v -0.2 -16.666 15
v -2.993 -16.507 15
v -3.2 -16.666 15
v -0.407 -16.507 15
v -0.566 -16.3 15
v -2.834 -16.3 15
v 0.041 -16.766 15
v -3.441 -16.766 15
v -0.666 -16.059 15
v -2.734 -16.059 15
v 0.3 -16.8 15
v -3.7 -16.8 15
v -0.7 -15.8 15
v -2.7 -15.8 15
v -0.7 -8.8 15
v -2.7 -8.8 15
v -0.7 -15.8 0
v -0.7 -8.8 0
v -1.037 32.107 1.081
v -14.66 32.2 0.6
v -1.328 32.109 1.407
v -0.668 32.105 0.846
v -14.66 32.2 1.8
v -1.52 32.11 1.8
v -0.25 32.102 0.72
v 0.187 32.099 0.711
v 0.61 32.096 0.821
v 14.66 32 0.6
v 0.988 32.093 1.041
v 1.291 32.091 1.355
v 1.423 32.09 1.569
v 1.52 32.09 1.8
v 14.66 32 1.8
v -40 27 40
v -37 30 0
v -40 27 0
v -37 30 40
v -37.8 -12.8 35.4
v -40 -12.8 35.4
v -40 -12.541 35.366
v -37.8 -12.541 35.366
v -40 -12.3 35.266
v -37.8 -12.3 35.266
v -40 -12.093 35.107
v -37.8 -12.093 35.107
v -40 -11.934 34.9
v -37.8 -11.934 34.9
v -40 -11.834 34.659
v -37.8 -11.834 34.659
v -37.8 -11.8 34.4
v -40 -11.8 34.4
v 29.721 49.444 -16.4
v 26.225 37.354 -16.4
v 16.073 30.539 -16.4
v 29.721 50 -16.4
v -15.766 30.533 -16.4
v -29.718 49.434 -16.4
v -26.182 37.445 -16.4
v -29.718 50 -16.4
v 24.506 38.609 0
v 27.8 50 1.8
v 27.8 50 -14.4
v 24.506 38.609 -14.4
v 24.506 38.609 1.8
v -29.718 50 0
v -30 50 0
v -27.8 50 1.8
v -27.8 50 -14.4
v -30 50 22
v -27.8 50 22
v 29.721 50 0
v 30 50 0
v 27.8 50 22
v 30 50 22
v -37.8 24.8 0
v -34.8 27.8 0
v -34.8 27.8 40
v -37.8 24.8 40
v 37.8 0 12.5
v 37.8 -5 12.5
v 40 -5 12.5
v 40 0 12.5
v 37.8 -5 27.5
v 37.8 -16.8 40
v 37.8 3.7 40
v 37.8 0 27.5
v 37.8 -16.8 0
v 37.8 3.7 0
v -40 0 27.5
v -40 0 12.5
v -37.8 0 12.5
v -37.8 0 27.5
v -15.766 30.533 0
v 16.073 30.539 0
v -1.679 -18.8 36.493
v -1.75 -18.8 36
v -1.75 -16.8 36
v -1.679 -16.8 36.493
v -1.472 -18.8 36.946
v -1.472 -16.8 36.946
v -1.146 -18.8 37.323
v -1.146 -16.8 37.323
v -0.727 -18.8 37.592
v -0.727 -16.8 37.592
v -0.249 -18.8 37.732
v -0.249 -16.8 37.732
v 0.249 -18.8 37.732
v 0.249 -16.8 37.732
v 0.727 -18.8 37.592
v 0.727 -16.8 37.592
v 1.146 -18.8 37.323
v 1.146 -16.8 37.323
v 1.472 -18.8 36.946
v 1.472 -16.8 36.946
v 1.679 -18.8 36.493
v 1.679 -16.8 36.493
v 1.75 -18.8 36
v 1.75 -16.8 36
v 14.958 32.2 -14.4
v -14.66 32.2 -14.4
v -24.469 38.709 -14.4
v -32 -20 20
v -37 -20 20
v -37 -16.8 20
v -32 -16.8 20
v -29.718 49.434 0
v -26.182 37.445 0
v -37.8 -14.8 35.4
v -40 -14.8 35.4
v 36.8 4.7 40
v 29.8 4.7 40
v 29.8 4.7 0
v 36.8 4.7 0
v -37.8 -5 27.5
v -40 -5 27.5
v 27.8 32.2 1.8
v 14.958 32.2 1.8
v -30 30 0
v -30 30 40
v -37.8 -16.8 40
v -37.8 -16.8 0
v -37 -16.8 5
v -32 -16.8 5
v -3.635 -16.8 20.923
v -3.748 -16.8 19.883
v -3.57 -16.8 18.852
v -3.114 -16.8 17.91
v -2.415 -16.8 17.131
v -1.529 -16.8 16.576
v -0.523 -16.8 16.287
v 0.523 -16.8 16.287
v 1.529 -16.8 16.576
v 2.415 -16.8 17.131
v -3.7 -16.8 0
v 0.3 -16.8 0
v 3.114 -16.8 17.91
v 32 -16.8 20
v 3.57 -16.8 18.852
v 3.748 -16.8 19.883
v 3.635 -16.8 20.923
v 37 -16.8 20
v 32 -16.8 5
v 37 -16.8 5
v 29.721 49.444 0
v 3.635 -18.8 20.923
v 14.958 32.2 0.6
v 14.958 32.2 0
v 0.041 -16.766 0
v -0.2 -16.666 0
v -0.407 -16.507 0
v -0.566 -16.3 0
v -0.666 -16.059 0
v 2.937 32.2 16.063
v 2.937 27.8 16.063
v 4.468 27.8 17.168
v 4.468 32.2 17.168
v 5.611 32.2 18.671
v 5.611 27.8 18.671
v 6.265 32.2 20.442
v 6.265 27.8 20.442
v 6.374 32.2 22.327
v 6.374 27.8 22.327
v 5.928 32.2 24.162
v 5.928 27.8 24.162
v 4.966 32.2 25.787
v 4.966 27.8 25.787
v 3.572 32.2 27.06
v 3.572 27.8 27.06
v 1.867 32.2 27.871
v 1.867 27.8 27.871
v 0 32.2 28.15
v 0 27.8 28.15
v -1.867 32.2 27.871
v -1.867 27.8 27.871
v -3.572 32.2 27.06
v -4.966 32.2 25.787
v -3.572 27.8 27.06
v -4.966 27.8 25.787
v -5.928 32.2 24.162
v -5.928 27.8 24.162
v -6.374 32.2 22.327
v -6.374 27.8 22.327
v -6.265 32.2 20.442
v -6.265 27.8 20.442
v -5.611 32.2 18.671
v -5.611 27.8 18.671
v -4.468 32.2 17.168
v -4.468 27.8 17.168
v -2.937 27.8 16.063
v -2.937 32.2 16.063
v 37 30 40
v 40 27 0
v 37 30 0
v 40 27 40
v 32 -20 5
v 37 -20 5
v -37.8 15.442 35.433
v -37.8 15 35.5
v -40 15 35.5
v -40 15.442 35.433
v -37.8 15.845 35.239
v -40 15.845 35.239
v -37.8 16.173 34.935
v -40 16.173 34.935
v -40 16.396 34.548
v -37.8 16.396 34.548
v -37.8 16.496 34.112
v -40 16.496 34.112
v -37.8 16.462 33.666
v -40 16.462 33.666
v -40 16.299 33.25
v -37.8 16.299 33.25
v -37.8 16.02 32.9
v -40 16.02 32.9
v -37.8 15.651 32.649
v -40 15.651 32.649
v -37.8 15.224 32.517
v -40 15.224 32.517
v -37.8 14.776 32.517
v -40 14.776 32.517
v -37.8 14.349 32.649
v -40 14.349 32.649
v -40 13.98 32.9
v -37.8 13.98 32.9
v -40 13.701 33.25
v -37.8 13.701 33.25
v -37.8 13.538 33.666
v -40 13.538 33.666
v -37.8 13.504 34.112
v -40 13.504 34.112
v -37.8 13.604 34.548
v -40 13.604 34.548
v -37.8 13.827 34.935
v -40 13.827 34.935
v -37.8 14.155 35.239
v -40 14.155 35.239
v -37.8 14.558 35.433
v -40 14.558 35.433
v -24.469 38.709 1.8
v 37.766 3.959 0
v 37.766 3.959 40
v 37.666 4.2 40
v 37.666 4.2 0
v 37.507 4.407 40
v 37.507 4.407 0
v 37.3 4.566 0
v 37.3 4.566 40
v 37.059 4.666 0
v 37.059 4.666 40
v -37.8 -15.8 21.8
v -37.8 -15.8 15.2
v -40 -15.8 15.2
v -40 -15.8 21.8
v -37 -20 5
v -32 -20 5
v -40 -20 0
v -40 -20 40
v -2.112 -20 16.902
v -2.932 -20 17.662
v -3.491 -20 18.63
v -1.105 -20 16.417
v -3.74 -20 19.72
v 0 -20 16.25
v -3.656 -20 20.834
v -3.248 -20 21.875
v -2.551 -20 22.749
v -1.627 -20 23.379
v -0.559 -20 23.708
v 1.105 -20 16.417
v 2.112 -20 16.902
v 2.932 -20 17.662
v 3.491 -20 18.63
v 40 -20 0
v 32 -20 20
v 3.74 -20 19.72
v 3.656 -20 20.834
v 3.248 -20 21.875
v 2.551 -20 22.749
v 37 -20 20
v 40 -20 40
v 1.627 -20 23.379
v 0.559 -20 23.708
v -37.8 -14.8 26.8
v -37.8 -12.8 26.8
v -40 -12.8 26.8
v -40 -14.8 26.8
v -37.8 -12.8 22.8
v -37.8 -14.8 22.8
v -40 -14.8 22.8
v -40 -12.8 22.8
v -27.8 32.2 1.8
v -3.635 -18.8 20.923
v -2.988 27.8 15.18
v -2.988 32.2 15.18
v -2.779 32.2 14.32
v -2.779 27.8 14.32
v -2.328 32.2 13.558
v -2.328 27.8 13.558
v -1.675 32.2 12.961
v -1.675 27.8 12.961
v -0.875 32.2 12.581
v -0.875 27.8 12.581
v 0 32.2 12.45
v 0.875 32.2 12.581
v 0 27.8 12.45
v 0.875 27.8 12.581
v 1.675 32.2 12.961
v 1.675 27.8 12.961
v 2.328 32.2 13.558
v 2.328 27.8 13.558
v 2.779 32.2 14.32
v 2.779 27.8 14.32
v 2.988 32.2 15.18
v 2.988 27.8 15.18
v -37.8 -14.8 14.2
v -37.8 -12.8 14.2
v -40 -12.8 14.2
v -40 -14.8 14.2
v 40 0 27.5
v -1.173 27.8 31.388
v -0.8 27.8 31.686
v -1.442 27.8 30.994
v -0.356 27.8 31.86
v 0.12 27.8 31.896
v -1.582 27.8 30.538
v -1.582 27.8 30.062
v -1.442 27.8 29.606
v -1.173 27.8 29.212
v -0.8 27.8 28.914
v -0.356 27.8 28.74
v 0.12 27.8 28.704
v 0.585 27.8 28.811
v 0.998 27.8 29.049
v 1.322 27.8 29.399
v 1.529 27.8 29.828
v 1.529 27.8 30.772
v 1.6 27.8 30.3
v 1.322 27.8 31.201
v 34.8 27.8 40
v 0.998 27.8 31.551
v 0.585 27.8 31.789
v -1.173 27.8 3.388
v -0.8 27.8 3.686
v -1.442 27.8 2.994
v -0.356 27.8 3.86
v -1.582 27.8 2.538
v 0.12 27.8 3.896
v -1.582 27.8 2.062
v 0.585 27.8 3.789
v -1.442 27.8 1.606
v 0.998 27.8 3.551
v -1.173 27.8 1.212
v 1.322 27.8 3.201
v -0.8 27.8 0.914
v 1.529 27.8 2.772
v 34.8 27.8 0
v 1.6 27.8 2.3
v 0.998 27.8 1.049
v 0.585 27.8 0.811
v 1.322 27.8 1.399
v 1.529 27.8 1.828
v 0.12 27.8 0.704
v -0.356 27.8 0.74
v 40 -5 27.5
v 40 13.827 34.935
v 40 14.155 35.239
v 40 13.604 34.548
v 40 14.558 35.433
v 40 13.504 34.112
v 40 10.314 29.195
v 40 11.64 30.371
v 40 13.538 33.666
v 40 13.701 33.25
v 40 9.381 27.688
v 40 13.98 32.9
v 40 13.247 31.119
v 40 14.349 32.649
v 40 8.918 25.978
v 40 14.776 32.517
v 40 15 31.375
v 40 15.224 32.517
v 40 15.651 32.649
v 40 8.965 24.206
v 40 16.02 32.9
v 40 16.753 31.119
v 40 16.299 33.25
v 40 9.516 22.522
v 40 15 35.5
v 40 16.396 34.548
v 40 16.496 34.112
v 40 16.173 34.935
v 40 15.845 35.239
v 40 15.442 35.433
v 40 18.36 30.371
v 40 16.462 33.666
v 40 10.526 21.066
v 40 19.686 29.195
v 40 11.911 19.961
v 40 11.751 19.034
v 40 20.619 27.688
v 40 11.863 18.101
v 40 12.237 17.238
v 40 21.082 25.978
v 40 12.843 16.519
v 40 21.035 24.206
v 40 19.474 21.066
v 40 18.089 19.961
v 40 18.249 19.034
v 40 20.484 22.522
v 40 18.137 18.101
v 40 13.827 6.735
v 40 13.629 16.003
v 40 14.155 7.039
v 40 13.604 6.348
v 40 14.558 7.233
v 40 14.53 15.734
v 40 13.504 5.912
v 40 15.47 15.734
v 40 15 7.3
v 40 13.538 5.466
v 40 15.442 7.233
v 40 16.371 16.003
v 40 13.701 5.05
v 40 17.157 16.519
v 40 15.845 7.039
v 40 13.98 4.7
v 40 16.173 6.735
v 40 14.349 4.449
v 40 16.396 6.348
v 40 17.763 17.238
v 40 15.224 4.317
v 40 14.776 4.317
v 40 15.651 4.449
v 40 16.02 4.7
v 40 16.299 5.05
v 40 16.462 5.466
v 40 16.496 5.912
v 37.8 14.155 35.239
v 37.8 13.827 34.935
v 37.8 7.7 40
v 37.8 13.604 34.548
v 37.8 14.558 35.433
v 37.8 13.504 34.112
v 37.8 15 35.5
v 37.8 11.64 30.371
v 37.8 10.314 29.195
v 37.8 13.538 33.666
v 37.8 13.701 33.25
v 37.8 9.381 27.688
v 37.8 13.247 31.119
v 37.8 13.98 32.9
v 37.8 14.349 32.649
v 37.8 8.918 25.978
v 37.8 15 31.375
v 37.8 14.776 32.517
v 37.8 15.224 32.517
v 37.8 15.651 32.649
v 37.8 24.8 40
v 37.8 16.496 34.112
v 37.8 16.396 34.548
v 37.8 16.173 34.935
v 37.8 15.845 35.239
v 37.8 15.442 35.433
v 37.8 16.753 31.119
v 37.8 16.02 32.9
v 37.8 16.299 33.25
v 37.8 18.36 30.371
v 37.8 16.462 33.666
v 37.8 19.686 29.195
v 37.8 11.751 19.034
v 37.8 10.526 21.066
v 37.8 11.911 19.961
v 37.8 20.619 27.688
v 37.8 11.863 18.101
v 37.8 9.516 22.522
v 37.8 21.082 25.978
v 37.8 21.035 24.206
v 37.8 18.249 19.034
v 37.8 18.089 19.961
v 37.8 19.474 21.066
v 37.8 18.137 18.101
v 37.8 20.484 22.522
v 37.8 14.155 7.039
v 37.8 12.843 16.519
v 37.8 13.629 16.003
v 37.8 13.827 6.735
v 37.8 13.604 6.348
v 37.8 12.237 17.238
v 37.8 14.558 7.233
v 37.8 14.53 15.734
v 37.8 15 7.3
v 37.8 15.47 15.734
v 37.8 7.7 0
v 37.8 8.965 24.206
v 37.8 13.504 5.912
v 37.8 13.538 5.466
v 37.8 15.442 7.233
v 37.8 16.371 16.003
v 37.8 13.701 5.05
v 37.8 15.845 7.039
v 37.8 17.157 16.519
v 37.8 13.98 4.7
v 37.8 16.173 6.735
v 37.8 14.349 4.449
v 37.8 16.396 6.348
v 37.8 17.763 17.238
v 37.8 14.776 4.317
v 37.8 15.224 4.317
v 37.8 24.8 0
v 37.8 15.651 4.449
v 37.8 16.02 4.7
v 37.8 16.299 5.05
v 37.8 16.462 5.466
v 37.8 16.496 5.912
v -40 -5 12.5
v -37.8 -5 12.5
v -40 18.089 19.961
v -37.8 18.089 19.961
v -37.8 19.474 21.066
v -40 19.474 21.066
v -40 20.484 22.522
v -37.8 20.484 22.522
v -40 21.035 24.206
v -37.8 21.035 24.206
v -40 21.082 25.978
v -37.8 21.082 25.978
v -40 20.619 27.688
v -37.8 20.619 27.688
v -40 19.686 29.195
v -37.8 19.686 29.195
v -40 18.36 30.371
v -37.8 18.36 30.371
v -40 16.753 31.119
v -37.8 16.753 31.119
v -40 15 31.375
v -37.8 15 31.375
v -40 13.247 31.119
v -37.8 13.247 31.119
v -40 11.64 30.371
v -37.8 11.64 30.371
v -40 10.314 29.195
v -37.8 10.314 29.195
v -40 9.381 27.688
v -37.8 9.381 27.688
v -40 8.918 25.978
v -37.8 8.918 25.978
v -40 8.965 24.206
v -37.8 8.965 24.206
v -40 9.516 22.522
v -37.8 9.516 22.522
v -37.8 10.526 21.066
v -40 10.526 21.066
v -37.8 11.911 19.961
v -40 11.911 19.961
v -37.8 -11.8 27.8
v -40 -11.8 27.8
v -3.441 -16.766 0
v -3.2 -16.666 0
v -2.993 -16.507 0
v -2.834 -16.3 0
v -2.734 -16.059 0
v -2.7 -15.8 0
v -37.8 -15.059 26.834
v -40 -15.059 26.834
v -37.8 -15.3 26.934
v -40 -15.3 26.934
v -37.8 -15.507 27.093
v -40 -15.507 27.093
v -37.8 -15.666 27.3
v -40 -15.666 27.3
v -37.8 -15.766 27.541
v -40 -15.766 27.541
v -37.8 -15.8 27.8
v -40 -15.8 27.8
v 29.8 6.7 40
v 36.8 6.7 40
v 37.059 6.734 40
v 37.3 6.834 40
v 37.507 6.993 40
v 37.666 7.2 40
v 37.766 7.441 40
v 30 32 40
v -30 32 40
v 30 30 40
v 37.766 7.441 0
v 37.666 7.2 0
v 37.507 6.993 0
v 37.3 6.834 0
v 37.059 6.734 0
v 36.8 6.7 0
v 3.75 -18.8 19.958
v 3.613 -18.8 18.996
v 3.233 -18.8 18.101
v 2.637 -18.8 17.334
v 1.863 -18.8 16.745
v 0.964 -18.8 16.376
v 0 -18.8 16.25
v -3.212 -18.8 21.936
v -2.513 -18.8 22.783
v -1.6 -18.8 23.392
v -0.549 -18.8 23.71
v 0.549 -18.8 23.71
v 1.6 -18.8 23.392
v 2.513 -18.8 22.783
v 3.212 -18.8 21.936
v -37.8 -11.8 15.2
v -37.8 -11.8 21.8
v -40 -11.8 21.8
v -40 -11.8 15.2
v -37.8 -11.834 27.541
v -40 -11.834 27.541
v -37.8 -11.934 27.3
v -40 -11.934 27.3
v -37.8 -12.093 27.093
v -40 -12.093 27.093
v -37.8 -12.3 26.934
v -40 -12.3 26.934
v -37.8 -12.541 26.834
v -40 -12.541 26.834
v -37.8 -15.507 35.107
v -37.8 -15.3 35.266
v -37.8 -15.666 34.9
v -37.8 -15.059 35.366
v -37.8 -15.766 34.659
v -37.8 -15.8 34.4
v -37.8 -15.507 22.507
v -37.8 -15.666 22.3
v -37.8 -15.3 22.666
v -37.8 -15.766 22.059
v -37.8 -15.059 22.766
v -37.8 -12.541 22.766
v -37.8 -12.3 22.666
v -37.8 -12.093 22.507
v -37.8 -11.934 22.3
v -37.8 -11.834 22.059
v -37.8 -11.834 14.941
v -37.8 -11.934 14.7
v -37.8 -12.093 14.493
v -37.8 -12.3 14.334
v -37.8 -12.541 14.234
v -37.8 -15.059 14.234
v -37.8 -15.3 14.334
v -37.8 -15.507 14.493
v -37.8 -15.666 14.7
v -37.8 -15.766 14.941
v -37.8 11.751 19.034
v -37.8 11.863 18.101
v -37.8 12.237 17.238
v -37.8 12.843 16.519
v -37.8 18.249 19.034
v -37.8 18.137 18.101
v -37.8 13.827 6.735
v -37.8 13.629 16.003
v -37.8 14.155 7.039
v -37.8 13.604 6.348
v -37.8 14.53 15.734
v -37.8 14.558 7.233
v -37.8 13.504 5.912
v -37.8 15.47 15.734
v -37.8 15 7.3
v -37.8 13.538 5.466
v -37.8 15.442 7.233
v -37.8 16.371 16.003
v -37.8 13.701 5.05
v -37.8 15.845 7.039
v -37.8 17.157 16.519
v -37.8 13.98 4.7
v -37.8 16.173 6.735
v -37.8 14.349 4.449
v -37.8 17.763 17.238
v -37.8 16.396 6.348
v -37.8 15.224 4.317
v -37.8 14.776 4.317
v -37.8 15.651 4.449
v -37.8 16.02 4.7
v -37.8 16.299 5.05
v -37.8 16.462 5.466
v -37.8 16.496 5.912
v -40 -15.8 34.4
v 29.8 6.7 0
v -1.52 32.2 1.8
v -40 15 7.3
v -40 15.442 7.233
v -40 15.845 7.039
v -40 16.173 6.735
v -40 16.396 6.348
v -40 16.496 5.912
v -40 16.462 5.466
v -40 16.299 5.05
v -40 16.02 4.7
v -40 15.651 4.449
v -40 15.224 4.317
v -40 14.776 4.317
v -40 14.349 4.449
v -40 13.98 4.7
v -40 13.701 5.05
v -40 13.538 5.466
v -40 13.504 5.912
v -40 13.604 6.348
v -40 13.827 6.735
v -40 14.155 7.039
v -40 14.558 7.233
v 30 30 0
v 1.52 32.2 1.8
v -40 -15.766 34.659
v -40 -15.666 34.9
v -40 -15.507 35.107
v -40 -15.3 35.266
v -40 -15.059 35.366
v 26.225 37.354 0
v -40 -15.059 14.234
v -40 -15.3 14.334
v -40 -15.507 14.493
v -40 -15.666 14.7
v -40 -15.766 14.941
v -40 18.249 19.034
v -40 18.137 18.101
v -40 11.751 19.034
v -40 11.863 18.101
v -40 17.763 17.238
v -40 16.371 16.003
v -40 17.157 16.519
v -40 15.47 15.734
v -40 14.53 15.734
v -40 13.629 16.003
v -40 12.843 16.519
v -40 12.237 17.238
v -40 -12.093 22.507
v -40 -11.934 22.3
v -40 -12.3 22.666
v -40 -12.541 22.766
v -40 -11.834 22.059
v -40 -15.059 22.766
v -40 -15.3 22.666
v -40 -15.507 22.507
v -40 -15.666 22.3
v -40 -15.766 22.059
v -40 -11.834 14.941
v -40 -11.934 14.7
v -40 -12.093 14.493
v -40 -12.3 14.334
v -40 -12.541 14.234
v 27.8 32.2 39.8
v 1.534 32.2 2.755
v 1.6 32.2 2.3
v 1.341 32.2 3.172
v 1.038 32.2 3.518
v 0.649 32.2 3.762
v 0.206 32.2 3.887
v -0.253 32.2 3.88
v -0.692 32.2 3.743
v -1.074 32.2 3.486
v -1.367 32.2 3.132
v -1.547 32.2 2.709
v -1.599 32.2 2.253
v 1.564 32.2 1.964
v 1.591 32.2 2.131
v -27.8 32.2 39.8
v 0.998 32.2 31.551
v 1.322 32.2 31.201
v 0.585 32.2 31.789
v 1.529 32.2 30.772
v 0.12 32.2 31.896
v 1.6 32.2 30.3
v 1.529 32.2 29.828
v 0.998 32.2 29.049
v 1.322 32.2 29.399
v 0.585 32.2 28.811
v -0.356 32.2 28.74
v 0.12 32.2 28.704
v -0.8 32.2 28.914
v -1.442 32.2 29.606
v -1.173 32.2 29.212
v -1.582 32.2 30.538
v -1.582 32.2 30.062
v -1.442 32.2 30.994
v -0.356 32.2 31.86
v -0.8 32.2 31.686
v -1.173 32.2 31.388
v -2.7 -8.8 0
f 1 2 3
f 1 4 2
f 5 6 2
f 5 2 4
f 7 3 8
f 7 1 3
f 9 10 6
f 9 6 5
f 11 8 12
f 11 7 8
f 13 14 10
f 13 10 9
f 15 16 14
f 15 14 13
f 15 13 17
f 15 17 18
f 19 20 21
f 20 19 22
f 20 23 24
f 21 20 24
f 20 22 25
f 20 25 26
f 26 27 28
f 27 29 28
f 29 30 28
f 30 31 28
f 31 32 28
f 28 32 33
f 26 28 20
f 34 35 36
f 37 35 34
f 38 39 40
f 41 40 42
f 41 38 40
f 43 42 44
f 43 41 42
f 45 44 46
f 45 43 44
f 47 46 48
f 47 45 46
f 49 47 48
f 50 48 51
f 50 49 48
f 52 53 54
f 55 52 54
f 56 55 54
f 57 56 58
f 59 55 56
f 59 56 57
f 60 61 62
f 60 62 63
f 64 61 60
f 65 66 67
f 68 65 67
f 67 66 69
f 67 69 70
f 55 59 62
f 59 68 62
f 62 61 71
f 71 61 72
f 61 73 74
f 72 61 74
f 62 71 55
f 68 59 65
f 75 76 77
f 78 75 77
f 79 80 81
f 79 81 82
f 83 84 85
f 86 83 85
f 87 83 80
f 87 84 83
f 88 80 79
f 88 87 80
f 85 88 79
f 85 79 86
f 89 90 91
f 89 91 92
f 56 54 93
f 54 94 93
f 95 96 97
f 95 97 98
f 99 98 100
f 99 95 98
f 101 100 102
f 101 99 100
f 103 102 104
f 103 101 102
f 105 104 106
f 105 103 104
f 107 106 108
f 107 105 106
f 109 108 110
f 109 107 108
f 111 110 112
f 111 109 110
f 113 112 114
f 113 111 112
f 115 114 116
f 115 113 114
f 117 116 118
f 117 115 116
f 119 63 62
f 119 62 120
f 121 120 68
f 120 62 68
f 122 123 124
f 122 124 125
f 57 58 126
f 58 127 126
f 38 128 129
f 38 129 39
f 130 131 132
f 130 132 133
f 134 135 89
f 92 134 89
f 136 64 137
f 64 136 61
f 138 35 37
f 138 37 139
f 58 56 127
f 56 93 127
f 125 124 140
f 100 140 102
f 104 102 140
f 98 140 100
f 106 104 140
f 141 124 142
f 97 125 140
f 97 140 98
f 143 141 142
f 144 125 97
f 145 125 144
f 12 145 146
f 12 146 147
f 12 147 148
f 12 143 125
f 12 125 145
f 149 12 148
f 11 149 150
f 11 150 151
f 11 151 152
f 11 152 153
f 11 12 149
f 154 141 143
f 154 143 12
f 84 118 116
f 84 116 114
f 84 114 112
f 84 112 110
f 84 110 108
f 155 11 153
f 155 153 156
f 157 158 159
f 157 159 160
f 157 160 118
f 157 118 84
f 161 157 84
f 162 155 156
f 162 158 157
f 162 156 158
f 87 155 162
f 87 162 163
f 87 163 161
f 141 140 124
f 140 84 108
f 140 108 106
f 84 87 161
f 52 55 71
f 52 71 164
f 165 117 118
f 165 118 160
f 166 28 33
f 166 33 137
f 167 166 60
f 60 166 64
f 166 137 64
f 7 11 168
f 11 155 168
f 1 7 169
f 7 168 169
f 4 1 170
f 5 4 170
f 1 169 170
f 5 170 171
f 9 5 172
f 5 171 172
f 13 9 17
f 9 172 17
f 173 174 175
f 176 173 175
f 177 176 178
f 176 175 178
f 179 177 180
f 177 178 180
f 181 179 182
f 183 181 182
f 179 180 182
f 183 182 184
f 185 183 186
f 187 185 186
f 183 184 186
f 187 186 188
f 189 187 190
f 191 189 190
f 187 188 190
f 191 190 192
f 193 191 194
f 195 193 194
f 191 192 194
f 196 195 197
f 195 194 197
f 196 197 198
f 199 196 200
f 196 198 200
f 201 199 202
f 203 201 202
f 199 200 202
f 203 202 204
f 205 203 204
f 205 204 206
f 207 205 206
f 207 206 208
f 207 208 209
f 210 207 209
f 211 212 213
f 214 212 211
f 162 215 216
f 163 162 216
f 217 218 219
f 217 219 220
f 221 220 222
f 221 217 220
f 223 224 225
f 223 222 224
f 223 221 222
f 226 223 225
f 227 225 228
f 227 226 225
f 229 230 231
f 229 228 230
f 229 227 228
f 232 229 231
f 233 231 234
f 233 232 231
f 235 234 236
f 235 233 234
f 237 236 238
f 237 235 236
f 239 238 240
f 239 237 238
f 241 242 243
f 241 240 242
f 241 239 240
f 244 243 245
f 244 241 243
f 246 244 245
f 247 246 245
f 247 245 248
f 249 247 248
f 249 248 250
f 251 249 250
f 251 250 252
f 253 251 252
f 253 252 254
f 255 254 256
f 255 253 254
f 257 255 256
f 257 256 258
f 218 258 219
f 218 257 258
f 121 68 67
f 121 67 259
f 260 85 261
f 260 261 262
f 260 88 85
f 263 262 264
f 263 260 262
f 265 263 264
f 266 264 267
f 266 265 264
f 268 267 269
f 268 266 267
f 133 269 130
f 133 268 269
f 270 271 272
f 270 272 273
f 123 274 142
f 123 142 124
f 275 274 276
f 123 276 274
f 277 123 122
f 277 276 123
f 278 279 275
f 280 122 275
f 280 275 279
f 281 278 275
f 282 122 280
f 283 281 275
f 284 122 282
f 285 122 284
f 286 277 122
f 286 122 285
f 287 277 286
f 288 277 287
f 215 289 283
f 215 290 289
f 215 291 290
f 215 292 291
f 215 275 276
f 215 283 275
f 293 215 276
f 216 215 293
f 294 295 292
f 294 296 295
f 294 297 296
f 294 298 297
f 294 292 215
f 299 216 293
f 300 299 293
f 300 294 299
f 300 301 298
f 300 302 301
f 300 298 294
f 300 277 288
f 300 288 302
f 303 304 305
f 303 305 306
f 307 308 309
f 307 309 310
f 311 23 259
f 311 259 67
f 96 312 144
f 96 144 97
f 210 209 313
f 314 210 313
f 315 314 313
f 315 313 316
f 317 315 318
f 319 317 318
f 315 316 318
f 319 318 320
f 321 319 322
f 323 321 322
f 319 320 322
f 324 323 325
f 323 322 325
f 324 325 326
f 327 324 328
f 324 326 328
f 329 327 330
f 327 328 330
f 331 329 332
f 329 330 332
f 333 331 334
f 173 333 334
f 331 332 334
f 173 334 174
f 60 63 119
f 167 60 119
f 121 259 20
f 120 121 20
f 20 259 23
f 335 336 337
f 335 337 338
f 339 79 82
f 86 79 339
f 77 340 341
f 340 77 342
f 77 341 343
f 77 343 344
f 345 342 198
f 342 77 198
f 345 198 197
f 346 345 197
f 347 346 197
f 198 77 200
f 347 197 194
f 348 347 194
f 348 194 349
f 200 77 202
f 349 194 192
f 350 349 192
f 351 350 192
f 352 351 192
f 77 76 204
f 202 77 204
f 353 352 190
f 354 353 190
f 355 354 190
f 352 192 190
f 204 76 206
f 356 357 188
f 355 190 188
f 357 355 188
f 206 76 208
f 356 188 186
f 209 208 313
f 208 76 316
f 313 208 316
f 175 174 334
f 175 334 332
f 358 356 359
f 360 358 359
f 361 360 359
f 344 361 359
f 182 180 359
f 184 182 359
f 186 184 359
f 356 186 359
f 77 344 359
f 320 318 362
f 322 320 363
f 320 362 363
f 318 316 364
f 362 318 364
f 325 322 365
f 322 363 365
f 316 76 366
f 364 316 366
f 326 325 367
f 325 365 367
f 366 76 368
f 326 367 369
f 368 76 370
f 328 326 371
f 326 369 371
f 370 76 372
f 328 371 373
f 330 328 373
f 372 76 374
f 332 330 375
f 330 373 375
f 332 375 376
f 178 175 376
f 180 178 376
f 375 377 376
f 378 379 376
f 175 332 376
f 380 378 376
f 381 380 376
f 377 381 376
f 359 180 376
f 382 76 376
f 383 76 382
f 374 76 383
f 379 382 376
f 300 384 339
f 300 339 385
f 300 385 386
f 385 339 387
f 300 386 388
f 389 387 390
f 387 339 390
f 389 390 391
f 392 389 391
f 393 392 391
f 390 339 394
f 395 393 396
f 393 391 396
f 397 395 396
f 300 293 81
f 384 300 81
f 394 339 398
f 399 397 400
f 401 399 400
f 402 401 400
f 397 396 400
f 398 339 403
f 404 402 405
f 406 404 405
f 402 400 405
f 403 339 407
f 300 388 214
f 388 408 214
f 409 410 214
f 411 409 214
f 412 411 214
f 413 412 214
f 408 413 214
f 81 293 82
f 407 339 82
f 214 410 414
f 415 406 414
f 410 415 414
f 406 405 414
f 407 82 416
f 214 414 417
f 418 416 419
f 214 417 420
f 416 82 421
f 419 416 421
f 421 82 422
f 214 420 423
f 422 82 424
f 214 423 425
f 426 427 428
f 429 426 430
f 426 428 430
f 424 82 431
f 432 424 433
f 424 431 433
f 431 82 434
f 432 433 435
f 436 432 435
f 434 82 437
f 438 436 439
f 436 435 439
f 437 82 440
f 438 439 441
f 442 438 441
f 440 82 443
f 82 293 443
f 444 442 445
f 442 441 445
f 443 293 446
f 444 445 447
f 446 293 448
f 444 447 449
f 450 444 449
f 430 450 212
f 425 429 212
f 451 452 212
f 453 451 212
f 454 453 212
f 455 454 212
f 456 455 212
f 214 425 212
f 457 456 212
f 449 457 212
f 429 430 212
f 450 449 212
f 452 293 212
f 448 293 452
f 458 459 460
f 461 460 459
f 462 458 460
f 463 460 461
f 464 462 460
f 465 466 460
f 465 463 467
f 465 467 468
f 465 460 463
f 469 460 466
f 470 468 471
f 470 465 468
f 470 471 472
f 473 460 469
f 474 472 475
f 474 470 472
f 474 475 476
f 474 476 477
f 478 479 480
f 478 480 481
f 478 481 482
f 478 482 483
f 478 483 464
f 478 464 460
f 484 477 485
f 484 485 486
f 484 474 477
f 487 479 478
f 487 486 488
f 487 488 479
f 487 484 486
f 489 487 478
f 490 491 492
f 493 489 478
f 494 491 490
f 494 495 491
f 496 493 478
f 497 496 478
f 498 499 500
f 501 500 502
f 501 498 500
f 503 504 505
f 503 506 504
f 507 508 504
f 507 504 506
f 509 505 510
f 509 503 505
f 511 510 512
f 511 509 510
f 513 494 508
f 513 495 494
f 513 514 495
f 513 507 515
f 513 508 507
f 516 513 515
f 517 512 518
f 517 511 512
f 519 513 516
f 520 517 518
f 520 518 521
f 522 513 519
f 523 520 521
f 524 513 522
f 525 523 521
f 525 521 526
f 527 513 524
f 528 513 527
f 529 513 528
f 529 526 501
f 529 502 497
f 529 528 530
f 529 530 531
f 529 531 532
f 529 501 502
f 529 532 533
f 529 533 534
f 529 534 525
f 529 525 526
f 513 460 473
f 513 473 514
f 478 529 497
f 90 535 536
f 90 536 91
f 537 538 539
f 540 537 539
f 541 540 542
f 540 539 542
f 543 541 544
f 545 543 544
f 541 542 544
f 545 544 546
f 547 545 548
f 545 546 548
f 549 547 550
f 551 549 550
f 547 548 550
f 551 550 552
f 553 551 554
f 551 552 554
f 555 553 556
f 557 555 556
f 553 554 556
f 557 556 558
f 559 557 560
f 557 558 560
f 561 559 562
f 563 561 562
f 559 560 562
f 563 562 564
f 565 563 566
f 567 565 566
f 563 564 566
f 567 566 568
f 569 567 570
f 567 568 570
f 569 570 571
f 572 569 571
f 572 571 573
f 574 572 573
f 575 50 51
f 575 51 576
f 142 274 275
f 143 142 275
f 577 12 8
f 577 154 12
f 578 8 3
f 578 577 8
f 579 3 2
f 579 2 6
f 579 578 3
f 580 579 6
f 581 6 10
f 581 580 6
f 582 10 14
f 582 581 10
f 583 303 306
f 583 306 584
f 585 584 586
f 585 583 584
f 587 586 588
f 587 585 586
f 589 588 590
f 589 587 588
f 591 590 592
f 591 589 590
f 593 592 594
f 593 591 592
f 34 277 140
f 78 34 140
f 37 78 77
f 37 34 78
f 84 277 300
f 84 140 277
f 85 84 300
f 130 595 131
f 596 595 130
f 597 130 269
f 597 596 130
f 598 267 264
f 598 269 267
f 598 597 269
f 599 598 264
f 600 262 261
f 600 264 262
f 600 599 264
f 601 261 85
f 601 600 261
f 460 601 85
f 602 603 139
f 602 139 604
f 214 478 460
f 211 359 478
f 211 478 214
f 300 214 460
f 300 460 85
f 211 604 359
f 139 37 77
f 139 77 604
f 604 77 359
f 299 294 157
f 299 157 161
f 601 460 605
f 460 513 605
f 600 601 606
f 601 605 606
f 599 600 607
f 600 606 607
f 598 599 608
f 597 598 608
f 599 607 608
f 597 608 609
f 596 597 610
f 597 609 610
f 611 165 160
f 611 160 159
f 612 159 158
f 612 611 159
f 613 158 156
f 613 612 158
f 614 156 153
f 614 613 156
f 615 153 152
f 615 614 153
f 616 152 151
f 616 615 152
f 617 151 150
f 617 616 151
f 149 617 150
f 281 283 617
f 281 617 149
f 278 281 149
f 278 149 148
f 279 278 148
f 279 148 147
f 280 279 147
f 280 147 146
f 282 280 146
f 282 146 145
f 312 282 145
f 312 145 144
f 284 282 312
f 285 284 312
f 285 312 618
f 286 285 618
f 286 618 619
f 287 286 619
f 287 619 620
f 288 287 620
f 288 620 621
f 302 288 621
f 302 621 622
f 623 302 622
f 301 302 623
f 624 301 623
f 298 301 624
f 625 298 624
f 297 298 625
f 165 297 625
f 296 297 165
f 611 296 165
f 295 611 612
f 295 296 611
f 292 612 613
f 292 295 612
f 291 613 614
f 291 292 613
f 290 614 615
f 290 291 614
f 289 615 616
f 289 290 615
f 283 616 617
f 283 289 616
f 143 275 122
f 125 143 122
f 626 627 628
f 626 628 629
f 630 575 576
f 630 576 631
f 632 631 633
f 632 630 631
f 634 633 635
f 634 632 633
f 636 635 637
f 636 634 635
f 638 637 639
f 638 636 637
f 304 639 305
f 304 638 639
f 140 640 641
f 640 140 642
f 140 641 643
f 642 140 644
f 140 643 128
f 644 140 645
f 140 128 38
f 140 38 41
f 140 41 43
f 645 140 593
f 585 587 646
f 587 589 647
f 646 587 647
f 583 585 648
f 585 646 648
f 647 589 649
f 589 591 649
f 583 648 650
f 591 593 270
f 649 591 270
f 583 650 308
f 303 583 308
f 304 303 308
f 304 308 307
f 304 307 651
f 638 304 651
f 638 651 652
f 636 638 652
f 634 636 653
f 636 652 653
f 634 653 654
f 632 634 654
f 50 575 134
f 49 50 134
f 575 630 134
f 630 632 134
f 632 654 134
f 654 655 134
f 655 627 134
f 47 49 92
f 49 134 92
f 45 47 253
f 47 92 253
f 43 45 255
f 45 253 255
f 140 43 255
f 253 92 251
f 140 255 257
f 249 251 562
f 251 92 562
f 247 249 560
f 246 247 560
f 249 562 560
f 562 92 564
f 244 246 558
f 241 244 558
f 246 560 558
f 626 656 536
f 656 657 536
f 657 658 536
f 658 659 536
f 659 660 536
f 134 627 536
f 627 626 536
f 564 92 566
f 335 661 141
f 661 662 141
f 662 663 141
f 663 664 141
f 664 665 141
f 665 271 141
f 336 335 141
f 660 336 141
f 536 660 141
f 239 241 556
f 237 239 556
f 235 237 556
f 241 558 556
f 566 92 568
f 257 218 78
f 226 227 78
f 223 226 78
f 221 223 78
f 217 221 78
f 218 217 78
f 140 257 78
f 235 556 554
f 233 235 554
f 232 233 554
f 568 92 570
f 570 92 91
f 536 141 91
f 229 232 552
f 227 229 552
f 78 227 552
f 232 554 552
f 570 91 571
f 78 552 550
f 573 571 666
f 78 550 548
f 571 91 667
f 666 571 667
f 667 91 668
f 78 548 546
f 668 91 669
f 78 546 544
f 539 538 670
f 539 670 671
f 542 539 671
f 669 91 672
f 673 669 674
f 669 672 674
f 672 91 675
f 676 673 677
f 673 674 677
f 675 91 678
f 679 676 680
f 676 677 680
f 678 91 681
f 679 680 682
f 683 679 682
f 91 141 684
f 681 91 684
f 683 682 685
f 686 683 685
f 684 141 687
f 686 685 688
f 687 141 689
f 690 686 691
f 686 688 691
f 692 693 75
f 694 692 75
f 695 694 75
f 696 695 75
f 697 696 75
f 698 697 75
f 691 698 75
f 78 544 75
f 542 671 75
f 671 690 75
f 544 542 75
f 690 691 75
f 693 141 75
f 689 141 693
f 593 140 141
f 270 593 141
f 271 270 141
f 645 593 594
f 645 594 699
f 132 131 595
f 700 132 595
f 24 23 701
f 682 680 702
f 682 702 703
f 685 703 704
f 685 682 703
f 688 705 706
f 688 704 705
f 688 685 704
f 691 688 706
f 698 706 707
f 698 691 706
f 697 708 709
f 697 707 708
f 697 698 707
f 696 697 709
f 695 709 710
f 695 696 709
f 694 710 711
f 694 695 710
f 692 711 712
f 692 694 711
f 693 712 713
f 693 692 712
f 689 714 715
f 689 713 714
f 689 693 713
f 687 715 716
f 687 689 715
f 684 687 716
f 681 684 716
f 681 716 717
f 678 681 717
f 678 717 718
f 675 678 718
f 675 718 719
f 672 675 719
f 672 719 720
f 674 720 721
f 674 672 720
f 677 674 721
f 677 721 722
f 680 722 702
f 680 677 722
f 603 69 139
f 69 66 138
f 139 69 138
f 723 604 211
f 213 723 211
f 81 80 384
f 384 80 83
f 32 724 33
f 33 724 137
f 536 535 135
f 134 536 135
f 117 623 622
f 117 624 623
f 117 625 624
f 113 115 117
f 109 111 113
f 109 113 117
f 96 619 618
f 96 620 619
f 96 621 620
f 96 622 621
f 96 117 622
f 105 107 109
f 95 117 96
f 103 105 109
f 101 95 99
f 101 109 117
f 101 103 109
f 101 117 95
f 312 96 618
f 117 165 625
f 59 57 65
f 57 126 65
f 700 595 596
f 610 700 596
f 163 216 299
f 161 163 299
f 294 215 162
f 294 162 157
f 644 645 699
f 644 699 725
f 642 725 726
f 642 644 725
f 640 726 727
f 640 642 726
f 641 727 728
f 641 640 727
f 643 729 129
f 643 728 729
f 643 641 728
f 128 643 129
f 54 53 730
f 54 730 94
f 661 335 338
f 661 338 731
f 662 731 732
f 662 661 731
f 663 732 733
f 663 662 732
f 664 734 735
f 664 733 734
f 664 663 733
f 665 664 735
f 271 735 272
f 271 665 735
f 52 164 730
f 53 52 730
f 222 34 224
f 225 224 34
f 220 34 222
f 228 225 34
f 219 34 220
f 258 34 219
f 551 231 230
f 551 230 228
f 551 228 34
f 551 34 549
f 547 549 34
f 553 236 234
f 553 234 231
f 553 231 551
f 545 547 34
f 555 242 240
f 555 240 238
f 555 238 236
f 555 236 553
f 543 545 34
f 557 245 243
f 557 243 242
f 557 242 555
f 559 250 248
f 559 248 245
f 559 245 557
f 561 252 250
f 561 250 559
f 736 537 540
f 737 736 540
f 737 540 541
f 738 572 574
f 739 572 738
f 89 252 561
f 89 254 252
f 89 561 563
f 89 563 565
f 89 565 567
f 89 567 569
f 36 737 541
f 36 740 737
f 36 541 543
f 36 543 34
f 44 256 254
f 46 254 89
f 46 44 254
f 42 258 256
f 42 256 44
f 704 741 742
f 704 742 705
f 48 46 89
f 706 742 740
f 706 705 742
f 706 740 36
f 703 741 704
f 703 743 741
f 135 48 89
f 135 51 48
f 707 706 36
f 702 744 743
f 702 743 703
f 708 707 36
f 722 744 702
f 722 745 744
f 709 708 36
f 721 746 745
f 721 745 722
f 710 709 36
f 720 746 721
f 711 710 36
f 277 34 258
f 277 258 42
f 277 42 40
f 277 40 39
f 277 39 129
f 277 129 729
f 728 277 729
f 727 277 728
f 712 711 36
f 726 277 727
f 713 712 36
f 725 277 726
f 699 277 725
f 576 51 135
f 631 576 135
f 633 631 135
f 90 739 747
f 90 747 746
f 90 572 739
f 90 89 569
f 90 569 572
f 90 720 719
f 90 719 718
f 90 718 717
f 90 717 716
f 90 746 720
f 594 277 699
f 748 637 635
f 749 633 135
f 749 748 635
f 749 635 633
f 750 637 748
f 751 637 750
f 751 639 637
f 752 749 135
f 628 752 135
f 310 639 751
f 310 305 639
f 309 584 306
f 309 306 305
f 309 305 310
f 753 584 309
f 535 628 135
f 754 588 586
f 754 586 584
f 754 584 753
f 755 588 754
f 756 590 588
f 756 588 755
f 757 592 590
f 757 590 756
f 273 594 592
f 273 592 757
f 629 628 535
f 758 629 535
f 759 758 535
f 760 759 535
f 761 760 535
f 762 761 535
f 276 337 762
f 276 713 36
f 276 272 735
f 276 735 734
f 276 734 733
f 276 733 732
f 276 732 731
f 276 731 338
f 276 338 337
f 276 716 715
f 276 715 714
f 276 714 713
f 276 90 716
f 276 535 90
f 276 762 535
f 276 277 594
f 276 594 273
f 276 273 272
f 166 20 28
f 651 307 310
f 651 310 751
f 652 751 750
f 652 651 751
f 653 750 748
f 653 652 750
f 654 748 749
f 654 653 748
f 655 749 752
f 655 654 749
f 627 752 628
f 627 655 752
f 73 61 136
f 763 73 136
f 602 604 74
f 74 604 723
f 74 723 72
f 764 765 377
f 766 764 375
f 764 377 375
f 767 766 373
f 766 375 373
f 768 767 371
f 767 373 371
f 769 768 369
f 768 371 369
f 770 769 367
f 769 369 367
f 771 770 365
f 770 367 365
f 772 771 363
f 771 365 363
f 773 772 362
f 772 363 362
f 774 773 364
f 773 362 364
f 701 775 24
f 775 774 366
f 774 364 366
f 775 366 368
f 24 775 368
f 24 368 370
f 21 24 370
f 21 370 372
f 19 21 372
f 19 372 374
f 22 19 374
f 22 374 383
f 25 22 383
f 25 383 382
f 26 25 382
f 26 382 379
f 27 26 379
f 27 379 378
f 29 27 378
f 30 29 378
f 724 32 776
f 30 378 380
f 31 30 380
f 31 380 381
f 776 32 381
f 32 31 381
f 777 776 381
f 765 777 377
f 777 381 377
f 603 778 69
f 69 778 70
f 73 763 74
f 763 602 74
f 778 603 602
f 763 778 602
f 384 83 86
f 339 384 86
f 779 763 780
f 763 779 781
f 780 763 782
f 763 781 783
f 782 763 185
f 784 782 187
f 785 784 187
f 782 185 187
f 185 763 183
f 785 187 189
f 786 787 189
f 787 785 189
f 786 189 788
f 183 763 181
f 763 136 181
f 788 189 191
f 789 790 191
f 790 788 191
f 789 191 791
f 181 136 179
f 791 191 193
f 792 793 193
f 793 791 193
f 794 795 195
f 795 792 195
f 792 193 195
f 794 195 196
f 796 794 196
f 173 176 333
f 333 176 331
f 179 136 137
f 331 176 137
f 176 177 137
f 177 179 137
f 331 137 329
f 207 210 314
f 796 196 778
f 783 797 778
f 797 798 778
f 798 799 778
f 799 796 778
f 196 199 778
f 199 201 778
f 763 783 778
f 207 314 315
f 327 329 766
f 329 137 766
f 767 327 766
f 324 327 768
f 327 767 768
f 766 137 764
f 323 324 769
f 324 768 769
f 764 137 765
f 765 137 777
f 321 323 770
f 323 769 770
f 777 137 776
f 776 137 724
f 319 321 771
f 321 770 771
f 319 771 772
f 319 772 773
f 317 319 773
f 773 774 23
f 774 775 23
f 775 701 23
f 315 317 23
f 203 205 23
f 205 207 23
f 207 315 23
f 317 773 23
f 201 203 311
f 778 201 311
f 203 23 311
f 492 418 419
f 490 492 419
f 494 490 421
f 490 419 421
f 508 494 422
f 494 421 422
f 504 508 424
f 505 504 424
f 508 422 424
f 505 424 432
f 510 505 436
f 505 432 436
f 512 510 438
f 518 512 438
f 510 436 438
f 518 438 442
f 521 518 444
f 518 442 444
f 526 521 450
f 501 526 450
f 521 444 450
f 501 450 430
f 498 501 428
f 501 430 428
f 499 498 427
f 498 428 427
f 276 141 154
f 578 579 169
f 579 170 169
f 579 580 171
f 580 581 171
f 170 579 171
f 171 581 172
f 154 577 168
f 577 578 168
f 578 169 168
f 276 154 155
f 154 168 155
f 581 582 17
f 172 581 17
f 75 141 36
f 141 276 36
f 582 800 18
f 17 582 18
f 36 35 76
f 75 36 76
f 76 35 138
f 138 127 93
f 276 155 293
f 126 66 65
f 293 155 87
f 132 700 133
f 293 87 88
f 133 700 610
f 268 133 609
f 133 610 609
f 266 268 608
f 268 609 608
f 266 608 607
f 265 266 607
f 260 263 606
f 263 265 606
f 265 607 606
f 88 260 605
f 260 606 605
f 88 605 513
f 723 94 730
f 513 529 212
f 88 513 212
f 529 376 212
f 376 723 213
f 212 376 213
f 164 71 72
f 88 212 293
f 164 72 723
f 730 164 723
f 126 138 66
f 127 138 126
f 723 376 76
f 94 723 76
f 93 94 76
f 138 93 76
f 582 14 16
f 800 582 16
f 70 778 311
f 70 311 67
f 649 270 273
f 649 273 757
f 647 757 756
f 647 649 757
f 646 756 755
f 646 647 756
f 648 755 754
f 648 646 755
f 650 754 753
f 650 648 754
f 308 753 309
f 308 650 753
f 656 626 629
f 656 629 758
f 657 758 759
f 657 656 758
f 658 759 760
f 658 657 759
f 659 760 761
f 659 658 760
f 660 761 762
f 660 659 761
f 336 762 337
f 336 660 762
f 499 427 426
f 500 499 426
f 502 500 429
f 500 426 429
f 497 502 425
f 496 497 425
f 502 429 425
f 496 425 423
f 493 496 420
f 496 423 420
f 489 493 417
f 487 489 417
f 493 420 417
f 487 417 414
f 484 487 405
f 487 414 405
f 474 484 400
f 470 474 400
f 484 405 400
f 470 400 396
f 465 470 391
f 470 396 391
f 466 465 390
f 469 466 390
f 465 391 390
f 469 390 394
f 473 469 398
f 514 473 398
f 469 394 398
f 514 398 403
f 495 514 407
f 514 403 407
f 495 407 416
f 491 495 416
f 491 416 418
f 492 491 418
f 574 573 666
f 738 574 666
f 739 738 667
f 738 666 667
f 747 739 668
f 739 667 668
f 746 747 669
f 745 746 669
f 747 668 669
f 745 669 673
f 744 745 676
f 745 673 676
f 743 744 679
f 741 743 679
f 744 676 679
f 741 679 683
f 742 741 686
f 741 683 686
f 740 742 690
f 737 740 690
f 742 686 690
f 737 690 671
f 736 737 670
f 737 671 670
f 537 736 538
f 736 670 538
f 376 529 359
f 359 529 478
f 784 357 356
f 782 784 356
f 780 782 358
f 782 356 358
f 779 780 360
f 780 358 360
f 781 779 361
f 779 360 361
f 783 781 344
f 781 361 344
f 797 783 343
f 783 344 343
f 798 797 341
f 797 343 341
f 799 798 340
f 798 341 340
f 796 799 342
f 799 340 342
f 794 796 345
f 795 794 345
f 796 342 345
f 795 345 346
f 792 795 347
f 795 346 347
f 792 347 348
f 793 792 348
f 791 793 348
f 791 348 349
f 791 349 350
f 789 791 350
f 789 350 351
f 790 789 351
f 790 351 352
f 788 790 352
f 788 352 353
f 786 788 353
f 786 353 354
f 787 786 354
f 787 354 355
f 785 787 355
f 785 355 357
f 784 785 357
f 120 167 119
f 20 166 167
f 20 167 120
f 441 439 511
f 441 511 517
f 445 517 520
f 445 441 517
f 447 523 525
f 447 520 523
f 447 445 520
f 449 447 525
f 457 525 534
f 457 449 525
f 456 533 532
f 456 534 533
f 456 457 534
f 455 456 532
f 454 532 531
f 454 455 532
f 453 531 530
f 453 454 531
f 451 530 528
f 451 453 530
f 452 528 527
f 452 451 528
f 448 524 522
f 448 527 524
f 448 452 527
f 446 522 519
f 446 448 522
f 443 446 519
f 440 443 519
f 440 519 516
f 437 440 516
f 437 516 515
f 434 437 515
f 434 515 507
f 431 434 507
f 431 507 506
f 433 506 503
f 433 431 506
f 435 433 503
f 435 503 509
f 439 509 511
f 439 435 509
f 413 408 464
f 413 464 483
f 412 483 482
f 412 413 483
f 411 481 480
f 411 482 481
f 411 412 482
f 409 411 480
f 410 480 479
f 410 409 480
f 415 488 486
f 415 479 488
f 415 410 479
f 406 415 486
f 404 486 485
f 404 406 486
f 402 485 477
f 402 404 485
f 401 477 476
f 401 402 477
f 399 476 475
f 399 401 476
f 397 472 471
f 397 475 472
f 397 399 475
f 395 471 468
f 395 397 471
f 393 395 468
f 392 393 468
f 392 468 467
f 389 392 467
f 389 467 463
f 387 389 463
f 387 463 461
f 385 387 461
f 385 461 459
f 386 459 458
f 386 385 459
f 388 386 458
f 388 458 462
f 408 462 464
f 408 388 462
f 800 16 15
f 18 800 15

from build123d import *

# Parameters (mm, degrees)
SKETCH1_W               = 80
SKETCH1_H               = 60
SKETCH1_W_2             = 75.6
SKETCH1_H_2             = 55.6
BOSS_EXTRUDE1_DEPTH     = 40
CHAMFER1_SIZE           = 18
SKETCH2_W               = 60
SKETCH2_H               = 20
BOSS_EXTRUDE2_DEPTH     = 1.8
SKETCH5_W               = 80
SKETCH5_H               = 50
SKETCH5_W_2             = 75.6
SKETCH5_H_2             = 45.6
BOSS_EXTRUDE3_DEPTH     = 40
SKETCH6_W               = 80
SKETCH6_H               = 10
CUT_EXTRUDE3_DEPTH      = 40
SKETCH7_R               = 1.6
SKETCH7_R_2             = 6.4
SKETCH7_R_3             = 3
CUT_EXTRUDE4_DEPTH      = 40
CUT_EXTRUDE5_DEPTH      = 101.761302096
CUT_EXTRUDE5_DEPTH_BACK = 40
SKETCH3_R               = 1.5
SKETCH4_R               = 3.25
SKETCH4_R_2             = 6.125
CUT_EXTRUDE6_DEPTH      = 103.46950766
SKETCH10_W              = 80
SKETCH10_H              = 40
BOSS_EXTRUDE4_DEPTH     = 1
SKETCH12_W              = 15
SKETCH12_H              = 5
CUT_EXTRUDE10_DEPTH     = 103.46950766
SKETCH13_W              = 5
SKETCH13_H              = 15
CUT_EXTRUDE11_DEPTH     = 10
CUT_EXTRUDE12_DEPTH     = 75.560311158
BOSS_EXTRUDE5_START     = -1.2
BOSS_EXTRUDE5_DEPTH     = 15
BOSS_EXTRUDE8_DEPTH     = 2
CHAMFER2_SIZE           = 3
CHAMFER3_SIZE           = 3
CUT_EXTRUDE15_START     = -1.2
CUT_EXTRUDE15_DEPTH     = 2.2
CUT_EXTRUDE16_START     = -2.2
SKETCH26_R              = 3.75
CUT_EXTRUDE16_DEPTH     = 2.2
BOSS_EXTRUDE9_START     = -25
SKETCH27_W              = 2
SKETCH27_H              = 8
BOSS_EXTRUDE9_DEPTH     = 15
FILLET1_R               = 1
SKETCH28_W              = 8
SKETCH28_H              = 2
BOSS_EXTRUDE10_DEPTH    = 40
FILLET2_R               = 1
CUT_EXTRUDE17_DEPTH     = 101.761302096


with BuildPart() as part:
    # Sketch1 → Boss-Extrude1 (new body)
    # profile 1 of 2: a face of its own
    with BuildSketch(Plane.XY):
        Polygon((-30, 50), (-30, 30), (30, 30), (30, 50), (27.8, 50), (27.8, 47.8), (27.8, 32.2), (-27.8, 32.2), (-27.8, 47.8), (-27.8, 50), align=None)
    # profile 2 of 2: a face of its own
    with BuildSketch(Plane.XY):
        Rectangle(SKETCH1_W, SKETCH1_H)
        Rectangle(SKETCH1_W_2, SKETCH1_H_2, mode=Mode.SUBTRACT)
    extrude(amount=BOSS_EXTRUDE1_DEPTH)

    # Chamfer1
    # the kernel refuses this chamfer: 18 mm, written as the material it takes off along each edge
    with BuildSketch(Plane(origin=(76.290293783, 50, 40), x_dir=(0, -0.9996219169112966, 0.02749587661058639), z_dir=(-1, 0, 0)), Plane(origin=(18.490293783, 50, 40), x_dir=(0, -0.9996219169112966, 0.02749587661058639), z_dir=(-1, 0, 0))) as chamfer1_piece_1:
        Polygon((CHAMFER1_SIZE * 0.999621916911, -CHAMFER1_SIZE * 0.0274958766106), (-CHAMFER1_SIZE * 0.0274958766106, -CHAMFER1_SIZE * 0.999621916911), (0, 0), align=None)
    extrude(amount=94.780587567, mode=Mode.SUBTRACT)

    # Sketch2 → Boss-Extrude2 (add)
    with BuildSketch(Plane(origin=(0, 0, 0), x_dir=(-1, 0, 0), z_dir=(0, 0, -1))):
        with Locations((0, 40)):
            Rectangle(SKETCH2_W, SKETCH2_H)
    extrude(amount=-BOSS_EXTRUDE2_DEPTH)

    # Sketch5 → Boss-Extrude3 (add)
    with BuildSketch(Plane.XY.offset(40)):
        with Locations((0, 5)):
            Rectangle(SKETCH5_W, SKETCH5_H)
        with Locations((0, 5)):
            Rectangle(SKETCH5_W_2, SKETCH5_H_2, mode=Mode.SUBTRACT)
    extrude(amount=-BOSS_EXTRUDE3_DEPTH)

    # Sketch6 → Cut-Extrude3 (cut)
    with BuildSketch(Plane.XY.offset(40)):
        with Locations((0, -25)):
            Rectangle(SKETCH6_W, SKETCH6_H)
    extrude(amount=-CUT_EXTRUDE3_DEPTH, mode=Mode.SUBTRACT)

    # Sketch7 → Cut-Extrude4 (cut)
    with BuildSketch(Plane.XZ.offset(-27.8)):
        with Locations((0, 2.3)):
            Circle(SKETCH7_R)
        with Locations((0, 21.75)):
            Circle(SKETCH7_R_2)
        with Locations((0, 15.45)):
            Circle(SKETCH7_R_3)
        with Locations((0, 30.3)):
            Circle(SKETCH7_R)
    extrude(amount=-CUT_EXTRUDE4_DEPTH, mode=Mode.SUBTRACT)

    # Sketch3 → Cut-Extrude5 (cut, two sides: drawn at the far end of the back side and taken through both)
    with BuildSketch(Plane.ZY.offset(-37.8).offset(-CUT_EXTRUDE5_DEPTH_BACK)):
        with Locations((34, 15)):
            Circle(SKETCH3_R)
        with Locations((5.8, 15)):
            Circle(SKETCH3_R)
    extrude(amount=CUT_EXTRUDE5_DEPTH + CUT_EXTRUDE5_DEPTH_BACK, mode=Mode.SUBTRACT)

    # Sketch4 → Cut-Extrude6 (cut, through all)
    with BuildSketch(Plane(origin=(40, 0, 0), x_dir=(0, 0, -1), z_dir=(1, 0, 0))):
        with Locations((-18.95, 15)):
            Circle(SKETCH4_R)
        with Locations((-25.25, 15)):
            Circle(SKETCH4_R_2)
    extrude(amount=-CUT_EXTRUDE6_DEPTH, mode=Mode.SUBTRACT)

    # Sketch10 → Boss-Extrude4 (add)
    with BuildSketch(Plane(origin=(0, -17.8, 0), x_dir=(1, 0, 0), z_dir=(0, 1, 0))):
        with Locations((0, -20)):
            Rectangle(SKETCH10_W, SKETCH10_H)
    extrude(amount=BOSS_EXTRUDE4_DEPTH)

    # Sketch12 → Cut-Extrude10 (cut, through all)
    with BuildSketch(Plane.ZY.offset(40)):
        with Locations((20, -2.5)):
            Rectangle(SKETCH12_W, SKETCH12_H)
    extrude(amount=-CUT_EXTRUDE10_DEPTH, mode=Mode.SUBTRACT)

    # Sketch13 → Cut-Extrude11 (cut)
    with BuildSketch(Plane.XZ.offset(20)):
        with Locations((-34.5, 12.5)):
            Rectangle(SKETCH13_W, SKETCH13_H)
        with Locations((34.5, 12.5)):
            Rectangle(SKETCH13_W, SKETCH13_H)
    extrude(amount=-CUT_EXTRUDE11_DEPTH, mode=Mode.SUBTRACT)

    # Sketch14 → Cut-Extrude12 (cut, through all)
    with BuildSketch(Plane.XY.offset(1.8)):
        Polygon((-27.8, 50), (-24.469302189, 38.708703588), (-14.659934208, 32.2), (14.659934208, 32), (24.505699212, 38.608703588), (27.8, 50), align=None)
    extrude(amount=-CUT_EXTRUDE12_DEPTH, mode=Mode.SUBTRACT)

    # Sketch15 → Boss-Extrude5 (add)
    with BuildSketch(Plane.XY.offset(1.8).offset(BOSS_EXTRUDE5_START)):
        Polygon((27.8, 50), (24.505699212, 38.608703588), (14.957897791, 32.2), (-14.659934208, 32.2), (-24.469302189, 38.708703588), (-27.8, 50), (-29.718283002, 50), (-29.718283002, 49.434146376), (-26.181631315, 37.44465205), (-15.765700543, 30.53348243), (16.07253082, 30.539399744), (26.224741306, 37.353796576), (29.721271707, 49.444378702), (29.721271707, 50), align=None)
    extrude(amount=-BOSS_EXTRUDE5_DEPTH)

    # Sketch22 → Boss-Extrude8 (add)
    with BuildSketch(Plane(origin=(0, 0, -14.4), x_dir=(-1, 0, 0), z_dir=(0, 0, -1))):
        Polygon((-26.224741306, 37.353796576), (-16.07253082, 30.539399744), (15.765700543, 30.53348243), (26.181631315, 37.44465205), (29.718283002, 49.434146376), (29.718283002, 50), (27.8, 50), (24.469302189, 38.708703588), (14.659934208, 32.2), (-14.957897791, 32.2), (-24.505699212, 38.608703588), (-27.8, 50), (-29.721271707, 50), (-29.721271707, 49.444378702), align=None)
        Polygon((-27.8, 50), (27.8, 50), (24.469302189, 38.708703588), (14.659934208, 32.2), (-14.957897791, 32.2), (-24.505699212, 38.608703588), align=None)
    extrude(amount=BOSS_EXTRUDE8_DEPTH)

    # Chamfer2
    chamfer2_edges = [part.edges().sort_by_distance(p)[0] for p in [
        (37.8, 27.8, 20),
        (-37.8, 27.8, 20),
    ]]
    chamfer(chamfer2_edges, length=CHAMFER2_SIZE)

    # Chamfer3
    chamfer3_edges = [part.edges().sort_by_distance(p)[0] for p in [
        (40, 30, 20),
        (-40, 30, 20),
    ]]
    chamfer(chamfer3_edges, length=CHAMFER3_SIZE)

    # Sketch25 → Cut-Extrude15 (cut)
    with BuildSketch(Plane.XZ.offset(20).offset(CUT_EXTRUDE15_START)):
        with BuildLine():
            Line((-3.634615385, 20.923076923), (-1.75, 36))
            ThreePointArc((-1.75, 36), (0, 37.75), (1.75, 36))
            Line((1.75, 36), (3.634615385, 20.923076923))
            ThreePointArc((3.634615385, 20.923076923), (0, 16.25), (-3.634615385, 20.923076923))
        make_face()
    extrude(amount=-CUT_EXTRUDE15_DEPTH, mode=Mode.SUBTRACT)

    # Sketch26 → Cut-Extrude16 (cut)
    with BuildSketch(Plane(origin=(0, -18.8, 0), x_dir=(1, 0, 0), z_dir=(0, 1, 0)).offset(CUT_EXTRUDE16_START)):
        with Locations(Location((0, -20, 0), (0, 0, 90))):
            Circle(SKETCH26_R)
    extrude(amount=CUT_EXTRUDE16_DEPTH, mode=Mode.SUBTRACT)

    # Sketch27 → Boss-Extrude9 (add)
    with BuildSketch(Plane.XY.offset(40).offset(BOSS_EXTRUDE9_START)):
        with Locations((-1.7, -12.8)):
            Rectangle(SKETCH27_W, SKETCH27_H)
    extrude(amount=-BOSS_EXTRUDE9_DEPTH)

    # Fillet1
    fillet1_edges = [part.edges().sort_by_distance(p)[0] for p in [
        (-0.7, -16.8, 7.5),
        (-2.7, -16.8, 7.5),
    ]]
    fillet(fillet1_edges, radius=FILLET1_R)

    # Sketch28 → Boss-Extrude10 (add)
    with BuildSketch(Plane.XY.offset(40)):
        with Locations((33.8, 5.7)):
            Rectangle(SKETCH28_W, SKETCH28_H)
    extrude(amount=-BOSS_EXTRUDE10_DEPTH)

    # Fillet2
    fillet2_edges = [part.edges().sort_by_distance(p)[0] for p in [
        (37.8, 6.7, 20),
        (37.8, 4.7, 20),
    ]]
    fillet(fillet2_edges, radius=FILLET2_R)

    # Sketch29 → Cut-Extrude17 (cut, through all)
    with BuildSketch(Plane(origin=(-37.8, 0, 0), x_dir=(0, 0, -1), z_dir=(1, 0, 0))):
        with BuildLine():
            Line((-34.4, -11.8), (-27.8, -11.8))
            ThreePointArc((-27.8, -11.8), (-27.092893219, -12.092893219), (-26.8, -12.8))
            Line((-26.8, -12.8), (-26.8, -14.8))
            ThreePointArc((-26.8, -14.8), (-27.092893219, -15.507106781), (-27.8, -15.8))
            Line((-27.8, -15.8), (-34.4, -15.8))
            ThreePointArc((-34.4, -15.8), (-35.107106781, -15.507106781), (-35.4, -14.8))
            Line((-35.4, -14.8), (-35.4, -12.8))
            ThreePointArc((-35.4, -12.8), (-35.107106781, -12.092893219), (-34.4, -11.8))
        make_face()
        with BuildLine():
            Line((-21.8, -11.8), (-15.2, -11.8))
            ThreePointArc((-15.2, -11.8), (-14.492893219, -12.092893219), (-14.2, -12.8))
            Line((-14.2, -12.8), (-14.2, -14.8))
            ThreePointArc((-14.2, -14.8), (-14.492893219, -15.507106781), (-15.2, -15.8))
            Line((-15.2, -15.8), (-21.8, -15.8))
            ThreePointArc((-21.8, -15.8), (-22.507106781, -15.507106781), (-22.8, -14.8))
            Line((-22.8, -14.8), (-22.8, -12.8))
            ThreePointArc((-22.8, -12.8), (-22.507106781, -12.092893219), (-21.8, -11.8))
        make_face()
    extrude(amount=-CUT_EXTRUDE17_DEPTH, mode=Mode.SUBTRACT)


solid = part.part
